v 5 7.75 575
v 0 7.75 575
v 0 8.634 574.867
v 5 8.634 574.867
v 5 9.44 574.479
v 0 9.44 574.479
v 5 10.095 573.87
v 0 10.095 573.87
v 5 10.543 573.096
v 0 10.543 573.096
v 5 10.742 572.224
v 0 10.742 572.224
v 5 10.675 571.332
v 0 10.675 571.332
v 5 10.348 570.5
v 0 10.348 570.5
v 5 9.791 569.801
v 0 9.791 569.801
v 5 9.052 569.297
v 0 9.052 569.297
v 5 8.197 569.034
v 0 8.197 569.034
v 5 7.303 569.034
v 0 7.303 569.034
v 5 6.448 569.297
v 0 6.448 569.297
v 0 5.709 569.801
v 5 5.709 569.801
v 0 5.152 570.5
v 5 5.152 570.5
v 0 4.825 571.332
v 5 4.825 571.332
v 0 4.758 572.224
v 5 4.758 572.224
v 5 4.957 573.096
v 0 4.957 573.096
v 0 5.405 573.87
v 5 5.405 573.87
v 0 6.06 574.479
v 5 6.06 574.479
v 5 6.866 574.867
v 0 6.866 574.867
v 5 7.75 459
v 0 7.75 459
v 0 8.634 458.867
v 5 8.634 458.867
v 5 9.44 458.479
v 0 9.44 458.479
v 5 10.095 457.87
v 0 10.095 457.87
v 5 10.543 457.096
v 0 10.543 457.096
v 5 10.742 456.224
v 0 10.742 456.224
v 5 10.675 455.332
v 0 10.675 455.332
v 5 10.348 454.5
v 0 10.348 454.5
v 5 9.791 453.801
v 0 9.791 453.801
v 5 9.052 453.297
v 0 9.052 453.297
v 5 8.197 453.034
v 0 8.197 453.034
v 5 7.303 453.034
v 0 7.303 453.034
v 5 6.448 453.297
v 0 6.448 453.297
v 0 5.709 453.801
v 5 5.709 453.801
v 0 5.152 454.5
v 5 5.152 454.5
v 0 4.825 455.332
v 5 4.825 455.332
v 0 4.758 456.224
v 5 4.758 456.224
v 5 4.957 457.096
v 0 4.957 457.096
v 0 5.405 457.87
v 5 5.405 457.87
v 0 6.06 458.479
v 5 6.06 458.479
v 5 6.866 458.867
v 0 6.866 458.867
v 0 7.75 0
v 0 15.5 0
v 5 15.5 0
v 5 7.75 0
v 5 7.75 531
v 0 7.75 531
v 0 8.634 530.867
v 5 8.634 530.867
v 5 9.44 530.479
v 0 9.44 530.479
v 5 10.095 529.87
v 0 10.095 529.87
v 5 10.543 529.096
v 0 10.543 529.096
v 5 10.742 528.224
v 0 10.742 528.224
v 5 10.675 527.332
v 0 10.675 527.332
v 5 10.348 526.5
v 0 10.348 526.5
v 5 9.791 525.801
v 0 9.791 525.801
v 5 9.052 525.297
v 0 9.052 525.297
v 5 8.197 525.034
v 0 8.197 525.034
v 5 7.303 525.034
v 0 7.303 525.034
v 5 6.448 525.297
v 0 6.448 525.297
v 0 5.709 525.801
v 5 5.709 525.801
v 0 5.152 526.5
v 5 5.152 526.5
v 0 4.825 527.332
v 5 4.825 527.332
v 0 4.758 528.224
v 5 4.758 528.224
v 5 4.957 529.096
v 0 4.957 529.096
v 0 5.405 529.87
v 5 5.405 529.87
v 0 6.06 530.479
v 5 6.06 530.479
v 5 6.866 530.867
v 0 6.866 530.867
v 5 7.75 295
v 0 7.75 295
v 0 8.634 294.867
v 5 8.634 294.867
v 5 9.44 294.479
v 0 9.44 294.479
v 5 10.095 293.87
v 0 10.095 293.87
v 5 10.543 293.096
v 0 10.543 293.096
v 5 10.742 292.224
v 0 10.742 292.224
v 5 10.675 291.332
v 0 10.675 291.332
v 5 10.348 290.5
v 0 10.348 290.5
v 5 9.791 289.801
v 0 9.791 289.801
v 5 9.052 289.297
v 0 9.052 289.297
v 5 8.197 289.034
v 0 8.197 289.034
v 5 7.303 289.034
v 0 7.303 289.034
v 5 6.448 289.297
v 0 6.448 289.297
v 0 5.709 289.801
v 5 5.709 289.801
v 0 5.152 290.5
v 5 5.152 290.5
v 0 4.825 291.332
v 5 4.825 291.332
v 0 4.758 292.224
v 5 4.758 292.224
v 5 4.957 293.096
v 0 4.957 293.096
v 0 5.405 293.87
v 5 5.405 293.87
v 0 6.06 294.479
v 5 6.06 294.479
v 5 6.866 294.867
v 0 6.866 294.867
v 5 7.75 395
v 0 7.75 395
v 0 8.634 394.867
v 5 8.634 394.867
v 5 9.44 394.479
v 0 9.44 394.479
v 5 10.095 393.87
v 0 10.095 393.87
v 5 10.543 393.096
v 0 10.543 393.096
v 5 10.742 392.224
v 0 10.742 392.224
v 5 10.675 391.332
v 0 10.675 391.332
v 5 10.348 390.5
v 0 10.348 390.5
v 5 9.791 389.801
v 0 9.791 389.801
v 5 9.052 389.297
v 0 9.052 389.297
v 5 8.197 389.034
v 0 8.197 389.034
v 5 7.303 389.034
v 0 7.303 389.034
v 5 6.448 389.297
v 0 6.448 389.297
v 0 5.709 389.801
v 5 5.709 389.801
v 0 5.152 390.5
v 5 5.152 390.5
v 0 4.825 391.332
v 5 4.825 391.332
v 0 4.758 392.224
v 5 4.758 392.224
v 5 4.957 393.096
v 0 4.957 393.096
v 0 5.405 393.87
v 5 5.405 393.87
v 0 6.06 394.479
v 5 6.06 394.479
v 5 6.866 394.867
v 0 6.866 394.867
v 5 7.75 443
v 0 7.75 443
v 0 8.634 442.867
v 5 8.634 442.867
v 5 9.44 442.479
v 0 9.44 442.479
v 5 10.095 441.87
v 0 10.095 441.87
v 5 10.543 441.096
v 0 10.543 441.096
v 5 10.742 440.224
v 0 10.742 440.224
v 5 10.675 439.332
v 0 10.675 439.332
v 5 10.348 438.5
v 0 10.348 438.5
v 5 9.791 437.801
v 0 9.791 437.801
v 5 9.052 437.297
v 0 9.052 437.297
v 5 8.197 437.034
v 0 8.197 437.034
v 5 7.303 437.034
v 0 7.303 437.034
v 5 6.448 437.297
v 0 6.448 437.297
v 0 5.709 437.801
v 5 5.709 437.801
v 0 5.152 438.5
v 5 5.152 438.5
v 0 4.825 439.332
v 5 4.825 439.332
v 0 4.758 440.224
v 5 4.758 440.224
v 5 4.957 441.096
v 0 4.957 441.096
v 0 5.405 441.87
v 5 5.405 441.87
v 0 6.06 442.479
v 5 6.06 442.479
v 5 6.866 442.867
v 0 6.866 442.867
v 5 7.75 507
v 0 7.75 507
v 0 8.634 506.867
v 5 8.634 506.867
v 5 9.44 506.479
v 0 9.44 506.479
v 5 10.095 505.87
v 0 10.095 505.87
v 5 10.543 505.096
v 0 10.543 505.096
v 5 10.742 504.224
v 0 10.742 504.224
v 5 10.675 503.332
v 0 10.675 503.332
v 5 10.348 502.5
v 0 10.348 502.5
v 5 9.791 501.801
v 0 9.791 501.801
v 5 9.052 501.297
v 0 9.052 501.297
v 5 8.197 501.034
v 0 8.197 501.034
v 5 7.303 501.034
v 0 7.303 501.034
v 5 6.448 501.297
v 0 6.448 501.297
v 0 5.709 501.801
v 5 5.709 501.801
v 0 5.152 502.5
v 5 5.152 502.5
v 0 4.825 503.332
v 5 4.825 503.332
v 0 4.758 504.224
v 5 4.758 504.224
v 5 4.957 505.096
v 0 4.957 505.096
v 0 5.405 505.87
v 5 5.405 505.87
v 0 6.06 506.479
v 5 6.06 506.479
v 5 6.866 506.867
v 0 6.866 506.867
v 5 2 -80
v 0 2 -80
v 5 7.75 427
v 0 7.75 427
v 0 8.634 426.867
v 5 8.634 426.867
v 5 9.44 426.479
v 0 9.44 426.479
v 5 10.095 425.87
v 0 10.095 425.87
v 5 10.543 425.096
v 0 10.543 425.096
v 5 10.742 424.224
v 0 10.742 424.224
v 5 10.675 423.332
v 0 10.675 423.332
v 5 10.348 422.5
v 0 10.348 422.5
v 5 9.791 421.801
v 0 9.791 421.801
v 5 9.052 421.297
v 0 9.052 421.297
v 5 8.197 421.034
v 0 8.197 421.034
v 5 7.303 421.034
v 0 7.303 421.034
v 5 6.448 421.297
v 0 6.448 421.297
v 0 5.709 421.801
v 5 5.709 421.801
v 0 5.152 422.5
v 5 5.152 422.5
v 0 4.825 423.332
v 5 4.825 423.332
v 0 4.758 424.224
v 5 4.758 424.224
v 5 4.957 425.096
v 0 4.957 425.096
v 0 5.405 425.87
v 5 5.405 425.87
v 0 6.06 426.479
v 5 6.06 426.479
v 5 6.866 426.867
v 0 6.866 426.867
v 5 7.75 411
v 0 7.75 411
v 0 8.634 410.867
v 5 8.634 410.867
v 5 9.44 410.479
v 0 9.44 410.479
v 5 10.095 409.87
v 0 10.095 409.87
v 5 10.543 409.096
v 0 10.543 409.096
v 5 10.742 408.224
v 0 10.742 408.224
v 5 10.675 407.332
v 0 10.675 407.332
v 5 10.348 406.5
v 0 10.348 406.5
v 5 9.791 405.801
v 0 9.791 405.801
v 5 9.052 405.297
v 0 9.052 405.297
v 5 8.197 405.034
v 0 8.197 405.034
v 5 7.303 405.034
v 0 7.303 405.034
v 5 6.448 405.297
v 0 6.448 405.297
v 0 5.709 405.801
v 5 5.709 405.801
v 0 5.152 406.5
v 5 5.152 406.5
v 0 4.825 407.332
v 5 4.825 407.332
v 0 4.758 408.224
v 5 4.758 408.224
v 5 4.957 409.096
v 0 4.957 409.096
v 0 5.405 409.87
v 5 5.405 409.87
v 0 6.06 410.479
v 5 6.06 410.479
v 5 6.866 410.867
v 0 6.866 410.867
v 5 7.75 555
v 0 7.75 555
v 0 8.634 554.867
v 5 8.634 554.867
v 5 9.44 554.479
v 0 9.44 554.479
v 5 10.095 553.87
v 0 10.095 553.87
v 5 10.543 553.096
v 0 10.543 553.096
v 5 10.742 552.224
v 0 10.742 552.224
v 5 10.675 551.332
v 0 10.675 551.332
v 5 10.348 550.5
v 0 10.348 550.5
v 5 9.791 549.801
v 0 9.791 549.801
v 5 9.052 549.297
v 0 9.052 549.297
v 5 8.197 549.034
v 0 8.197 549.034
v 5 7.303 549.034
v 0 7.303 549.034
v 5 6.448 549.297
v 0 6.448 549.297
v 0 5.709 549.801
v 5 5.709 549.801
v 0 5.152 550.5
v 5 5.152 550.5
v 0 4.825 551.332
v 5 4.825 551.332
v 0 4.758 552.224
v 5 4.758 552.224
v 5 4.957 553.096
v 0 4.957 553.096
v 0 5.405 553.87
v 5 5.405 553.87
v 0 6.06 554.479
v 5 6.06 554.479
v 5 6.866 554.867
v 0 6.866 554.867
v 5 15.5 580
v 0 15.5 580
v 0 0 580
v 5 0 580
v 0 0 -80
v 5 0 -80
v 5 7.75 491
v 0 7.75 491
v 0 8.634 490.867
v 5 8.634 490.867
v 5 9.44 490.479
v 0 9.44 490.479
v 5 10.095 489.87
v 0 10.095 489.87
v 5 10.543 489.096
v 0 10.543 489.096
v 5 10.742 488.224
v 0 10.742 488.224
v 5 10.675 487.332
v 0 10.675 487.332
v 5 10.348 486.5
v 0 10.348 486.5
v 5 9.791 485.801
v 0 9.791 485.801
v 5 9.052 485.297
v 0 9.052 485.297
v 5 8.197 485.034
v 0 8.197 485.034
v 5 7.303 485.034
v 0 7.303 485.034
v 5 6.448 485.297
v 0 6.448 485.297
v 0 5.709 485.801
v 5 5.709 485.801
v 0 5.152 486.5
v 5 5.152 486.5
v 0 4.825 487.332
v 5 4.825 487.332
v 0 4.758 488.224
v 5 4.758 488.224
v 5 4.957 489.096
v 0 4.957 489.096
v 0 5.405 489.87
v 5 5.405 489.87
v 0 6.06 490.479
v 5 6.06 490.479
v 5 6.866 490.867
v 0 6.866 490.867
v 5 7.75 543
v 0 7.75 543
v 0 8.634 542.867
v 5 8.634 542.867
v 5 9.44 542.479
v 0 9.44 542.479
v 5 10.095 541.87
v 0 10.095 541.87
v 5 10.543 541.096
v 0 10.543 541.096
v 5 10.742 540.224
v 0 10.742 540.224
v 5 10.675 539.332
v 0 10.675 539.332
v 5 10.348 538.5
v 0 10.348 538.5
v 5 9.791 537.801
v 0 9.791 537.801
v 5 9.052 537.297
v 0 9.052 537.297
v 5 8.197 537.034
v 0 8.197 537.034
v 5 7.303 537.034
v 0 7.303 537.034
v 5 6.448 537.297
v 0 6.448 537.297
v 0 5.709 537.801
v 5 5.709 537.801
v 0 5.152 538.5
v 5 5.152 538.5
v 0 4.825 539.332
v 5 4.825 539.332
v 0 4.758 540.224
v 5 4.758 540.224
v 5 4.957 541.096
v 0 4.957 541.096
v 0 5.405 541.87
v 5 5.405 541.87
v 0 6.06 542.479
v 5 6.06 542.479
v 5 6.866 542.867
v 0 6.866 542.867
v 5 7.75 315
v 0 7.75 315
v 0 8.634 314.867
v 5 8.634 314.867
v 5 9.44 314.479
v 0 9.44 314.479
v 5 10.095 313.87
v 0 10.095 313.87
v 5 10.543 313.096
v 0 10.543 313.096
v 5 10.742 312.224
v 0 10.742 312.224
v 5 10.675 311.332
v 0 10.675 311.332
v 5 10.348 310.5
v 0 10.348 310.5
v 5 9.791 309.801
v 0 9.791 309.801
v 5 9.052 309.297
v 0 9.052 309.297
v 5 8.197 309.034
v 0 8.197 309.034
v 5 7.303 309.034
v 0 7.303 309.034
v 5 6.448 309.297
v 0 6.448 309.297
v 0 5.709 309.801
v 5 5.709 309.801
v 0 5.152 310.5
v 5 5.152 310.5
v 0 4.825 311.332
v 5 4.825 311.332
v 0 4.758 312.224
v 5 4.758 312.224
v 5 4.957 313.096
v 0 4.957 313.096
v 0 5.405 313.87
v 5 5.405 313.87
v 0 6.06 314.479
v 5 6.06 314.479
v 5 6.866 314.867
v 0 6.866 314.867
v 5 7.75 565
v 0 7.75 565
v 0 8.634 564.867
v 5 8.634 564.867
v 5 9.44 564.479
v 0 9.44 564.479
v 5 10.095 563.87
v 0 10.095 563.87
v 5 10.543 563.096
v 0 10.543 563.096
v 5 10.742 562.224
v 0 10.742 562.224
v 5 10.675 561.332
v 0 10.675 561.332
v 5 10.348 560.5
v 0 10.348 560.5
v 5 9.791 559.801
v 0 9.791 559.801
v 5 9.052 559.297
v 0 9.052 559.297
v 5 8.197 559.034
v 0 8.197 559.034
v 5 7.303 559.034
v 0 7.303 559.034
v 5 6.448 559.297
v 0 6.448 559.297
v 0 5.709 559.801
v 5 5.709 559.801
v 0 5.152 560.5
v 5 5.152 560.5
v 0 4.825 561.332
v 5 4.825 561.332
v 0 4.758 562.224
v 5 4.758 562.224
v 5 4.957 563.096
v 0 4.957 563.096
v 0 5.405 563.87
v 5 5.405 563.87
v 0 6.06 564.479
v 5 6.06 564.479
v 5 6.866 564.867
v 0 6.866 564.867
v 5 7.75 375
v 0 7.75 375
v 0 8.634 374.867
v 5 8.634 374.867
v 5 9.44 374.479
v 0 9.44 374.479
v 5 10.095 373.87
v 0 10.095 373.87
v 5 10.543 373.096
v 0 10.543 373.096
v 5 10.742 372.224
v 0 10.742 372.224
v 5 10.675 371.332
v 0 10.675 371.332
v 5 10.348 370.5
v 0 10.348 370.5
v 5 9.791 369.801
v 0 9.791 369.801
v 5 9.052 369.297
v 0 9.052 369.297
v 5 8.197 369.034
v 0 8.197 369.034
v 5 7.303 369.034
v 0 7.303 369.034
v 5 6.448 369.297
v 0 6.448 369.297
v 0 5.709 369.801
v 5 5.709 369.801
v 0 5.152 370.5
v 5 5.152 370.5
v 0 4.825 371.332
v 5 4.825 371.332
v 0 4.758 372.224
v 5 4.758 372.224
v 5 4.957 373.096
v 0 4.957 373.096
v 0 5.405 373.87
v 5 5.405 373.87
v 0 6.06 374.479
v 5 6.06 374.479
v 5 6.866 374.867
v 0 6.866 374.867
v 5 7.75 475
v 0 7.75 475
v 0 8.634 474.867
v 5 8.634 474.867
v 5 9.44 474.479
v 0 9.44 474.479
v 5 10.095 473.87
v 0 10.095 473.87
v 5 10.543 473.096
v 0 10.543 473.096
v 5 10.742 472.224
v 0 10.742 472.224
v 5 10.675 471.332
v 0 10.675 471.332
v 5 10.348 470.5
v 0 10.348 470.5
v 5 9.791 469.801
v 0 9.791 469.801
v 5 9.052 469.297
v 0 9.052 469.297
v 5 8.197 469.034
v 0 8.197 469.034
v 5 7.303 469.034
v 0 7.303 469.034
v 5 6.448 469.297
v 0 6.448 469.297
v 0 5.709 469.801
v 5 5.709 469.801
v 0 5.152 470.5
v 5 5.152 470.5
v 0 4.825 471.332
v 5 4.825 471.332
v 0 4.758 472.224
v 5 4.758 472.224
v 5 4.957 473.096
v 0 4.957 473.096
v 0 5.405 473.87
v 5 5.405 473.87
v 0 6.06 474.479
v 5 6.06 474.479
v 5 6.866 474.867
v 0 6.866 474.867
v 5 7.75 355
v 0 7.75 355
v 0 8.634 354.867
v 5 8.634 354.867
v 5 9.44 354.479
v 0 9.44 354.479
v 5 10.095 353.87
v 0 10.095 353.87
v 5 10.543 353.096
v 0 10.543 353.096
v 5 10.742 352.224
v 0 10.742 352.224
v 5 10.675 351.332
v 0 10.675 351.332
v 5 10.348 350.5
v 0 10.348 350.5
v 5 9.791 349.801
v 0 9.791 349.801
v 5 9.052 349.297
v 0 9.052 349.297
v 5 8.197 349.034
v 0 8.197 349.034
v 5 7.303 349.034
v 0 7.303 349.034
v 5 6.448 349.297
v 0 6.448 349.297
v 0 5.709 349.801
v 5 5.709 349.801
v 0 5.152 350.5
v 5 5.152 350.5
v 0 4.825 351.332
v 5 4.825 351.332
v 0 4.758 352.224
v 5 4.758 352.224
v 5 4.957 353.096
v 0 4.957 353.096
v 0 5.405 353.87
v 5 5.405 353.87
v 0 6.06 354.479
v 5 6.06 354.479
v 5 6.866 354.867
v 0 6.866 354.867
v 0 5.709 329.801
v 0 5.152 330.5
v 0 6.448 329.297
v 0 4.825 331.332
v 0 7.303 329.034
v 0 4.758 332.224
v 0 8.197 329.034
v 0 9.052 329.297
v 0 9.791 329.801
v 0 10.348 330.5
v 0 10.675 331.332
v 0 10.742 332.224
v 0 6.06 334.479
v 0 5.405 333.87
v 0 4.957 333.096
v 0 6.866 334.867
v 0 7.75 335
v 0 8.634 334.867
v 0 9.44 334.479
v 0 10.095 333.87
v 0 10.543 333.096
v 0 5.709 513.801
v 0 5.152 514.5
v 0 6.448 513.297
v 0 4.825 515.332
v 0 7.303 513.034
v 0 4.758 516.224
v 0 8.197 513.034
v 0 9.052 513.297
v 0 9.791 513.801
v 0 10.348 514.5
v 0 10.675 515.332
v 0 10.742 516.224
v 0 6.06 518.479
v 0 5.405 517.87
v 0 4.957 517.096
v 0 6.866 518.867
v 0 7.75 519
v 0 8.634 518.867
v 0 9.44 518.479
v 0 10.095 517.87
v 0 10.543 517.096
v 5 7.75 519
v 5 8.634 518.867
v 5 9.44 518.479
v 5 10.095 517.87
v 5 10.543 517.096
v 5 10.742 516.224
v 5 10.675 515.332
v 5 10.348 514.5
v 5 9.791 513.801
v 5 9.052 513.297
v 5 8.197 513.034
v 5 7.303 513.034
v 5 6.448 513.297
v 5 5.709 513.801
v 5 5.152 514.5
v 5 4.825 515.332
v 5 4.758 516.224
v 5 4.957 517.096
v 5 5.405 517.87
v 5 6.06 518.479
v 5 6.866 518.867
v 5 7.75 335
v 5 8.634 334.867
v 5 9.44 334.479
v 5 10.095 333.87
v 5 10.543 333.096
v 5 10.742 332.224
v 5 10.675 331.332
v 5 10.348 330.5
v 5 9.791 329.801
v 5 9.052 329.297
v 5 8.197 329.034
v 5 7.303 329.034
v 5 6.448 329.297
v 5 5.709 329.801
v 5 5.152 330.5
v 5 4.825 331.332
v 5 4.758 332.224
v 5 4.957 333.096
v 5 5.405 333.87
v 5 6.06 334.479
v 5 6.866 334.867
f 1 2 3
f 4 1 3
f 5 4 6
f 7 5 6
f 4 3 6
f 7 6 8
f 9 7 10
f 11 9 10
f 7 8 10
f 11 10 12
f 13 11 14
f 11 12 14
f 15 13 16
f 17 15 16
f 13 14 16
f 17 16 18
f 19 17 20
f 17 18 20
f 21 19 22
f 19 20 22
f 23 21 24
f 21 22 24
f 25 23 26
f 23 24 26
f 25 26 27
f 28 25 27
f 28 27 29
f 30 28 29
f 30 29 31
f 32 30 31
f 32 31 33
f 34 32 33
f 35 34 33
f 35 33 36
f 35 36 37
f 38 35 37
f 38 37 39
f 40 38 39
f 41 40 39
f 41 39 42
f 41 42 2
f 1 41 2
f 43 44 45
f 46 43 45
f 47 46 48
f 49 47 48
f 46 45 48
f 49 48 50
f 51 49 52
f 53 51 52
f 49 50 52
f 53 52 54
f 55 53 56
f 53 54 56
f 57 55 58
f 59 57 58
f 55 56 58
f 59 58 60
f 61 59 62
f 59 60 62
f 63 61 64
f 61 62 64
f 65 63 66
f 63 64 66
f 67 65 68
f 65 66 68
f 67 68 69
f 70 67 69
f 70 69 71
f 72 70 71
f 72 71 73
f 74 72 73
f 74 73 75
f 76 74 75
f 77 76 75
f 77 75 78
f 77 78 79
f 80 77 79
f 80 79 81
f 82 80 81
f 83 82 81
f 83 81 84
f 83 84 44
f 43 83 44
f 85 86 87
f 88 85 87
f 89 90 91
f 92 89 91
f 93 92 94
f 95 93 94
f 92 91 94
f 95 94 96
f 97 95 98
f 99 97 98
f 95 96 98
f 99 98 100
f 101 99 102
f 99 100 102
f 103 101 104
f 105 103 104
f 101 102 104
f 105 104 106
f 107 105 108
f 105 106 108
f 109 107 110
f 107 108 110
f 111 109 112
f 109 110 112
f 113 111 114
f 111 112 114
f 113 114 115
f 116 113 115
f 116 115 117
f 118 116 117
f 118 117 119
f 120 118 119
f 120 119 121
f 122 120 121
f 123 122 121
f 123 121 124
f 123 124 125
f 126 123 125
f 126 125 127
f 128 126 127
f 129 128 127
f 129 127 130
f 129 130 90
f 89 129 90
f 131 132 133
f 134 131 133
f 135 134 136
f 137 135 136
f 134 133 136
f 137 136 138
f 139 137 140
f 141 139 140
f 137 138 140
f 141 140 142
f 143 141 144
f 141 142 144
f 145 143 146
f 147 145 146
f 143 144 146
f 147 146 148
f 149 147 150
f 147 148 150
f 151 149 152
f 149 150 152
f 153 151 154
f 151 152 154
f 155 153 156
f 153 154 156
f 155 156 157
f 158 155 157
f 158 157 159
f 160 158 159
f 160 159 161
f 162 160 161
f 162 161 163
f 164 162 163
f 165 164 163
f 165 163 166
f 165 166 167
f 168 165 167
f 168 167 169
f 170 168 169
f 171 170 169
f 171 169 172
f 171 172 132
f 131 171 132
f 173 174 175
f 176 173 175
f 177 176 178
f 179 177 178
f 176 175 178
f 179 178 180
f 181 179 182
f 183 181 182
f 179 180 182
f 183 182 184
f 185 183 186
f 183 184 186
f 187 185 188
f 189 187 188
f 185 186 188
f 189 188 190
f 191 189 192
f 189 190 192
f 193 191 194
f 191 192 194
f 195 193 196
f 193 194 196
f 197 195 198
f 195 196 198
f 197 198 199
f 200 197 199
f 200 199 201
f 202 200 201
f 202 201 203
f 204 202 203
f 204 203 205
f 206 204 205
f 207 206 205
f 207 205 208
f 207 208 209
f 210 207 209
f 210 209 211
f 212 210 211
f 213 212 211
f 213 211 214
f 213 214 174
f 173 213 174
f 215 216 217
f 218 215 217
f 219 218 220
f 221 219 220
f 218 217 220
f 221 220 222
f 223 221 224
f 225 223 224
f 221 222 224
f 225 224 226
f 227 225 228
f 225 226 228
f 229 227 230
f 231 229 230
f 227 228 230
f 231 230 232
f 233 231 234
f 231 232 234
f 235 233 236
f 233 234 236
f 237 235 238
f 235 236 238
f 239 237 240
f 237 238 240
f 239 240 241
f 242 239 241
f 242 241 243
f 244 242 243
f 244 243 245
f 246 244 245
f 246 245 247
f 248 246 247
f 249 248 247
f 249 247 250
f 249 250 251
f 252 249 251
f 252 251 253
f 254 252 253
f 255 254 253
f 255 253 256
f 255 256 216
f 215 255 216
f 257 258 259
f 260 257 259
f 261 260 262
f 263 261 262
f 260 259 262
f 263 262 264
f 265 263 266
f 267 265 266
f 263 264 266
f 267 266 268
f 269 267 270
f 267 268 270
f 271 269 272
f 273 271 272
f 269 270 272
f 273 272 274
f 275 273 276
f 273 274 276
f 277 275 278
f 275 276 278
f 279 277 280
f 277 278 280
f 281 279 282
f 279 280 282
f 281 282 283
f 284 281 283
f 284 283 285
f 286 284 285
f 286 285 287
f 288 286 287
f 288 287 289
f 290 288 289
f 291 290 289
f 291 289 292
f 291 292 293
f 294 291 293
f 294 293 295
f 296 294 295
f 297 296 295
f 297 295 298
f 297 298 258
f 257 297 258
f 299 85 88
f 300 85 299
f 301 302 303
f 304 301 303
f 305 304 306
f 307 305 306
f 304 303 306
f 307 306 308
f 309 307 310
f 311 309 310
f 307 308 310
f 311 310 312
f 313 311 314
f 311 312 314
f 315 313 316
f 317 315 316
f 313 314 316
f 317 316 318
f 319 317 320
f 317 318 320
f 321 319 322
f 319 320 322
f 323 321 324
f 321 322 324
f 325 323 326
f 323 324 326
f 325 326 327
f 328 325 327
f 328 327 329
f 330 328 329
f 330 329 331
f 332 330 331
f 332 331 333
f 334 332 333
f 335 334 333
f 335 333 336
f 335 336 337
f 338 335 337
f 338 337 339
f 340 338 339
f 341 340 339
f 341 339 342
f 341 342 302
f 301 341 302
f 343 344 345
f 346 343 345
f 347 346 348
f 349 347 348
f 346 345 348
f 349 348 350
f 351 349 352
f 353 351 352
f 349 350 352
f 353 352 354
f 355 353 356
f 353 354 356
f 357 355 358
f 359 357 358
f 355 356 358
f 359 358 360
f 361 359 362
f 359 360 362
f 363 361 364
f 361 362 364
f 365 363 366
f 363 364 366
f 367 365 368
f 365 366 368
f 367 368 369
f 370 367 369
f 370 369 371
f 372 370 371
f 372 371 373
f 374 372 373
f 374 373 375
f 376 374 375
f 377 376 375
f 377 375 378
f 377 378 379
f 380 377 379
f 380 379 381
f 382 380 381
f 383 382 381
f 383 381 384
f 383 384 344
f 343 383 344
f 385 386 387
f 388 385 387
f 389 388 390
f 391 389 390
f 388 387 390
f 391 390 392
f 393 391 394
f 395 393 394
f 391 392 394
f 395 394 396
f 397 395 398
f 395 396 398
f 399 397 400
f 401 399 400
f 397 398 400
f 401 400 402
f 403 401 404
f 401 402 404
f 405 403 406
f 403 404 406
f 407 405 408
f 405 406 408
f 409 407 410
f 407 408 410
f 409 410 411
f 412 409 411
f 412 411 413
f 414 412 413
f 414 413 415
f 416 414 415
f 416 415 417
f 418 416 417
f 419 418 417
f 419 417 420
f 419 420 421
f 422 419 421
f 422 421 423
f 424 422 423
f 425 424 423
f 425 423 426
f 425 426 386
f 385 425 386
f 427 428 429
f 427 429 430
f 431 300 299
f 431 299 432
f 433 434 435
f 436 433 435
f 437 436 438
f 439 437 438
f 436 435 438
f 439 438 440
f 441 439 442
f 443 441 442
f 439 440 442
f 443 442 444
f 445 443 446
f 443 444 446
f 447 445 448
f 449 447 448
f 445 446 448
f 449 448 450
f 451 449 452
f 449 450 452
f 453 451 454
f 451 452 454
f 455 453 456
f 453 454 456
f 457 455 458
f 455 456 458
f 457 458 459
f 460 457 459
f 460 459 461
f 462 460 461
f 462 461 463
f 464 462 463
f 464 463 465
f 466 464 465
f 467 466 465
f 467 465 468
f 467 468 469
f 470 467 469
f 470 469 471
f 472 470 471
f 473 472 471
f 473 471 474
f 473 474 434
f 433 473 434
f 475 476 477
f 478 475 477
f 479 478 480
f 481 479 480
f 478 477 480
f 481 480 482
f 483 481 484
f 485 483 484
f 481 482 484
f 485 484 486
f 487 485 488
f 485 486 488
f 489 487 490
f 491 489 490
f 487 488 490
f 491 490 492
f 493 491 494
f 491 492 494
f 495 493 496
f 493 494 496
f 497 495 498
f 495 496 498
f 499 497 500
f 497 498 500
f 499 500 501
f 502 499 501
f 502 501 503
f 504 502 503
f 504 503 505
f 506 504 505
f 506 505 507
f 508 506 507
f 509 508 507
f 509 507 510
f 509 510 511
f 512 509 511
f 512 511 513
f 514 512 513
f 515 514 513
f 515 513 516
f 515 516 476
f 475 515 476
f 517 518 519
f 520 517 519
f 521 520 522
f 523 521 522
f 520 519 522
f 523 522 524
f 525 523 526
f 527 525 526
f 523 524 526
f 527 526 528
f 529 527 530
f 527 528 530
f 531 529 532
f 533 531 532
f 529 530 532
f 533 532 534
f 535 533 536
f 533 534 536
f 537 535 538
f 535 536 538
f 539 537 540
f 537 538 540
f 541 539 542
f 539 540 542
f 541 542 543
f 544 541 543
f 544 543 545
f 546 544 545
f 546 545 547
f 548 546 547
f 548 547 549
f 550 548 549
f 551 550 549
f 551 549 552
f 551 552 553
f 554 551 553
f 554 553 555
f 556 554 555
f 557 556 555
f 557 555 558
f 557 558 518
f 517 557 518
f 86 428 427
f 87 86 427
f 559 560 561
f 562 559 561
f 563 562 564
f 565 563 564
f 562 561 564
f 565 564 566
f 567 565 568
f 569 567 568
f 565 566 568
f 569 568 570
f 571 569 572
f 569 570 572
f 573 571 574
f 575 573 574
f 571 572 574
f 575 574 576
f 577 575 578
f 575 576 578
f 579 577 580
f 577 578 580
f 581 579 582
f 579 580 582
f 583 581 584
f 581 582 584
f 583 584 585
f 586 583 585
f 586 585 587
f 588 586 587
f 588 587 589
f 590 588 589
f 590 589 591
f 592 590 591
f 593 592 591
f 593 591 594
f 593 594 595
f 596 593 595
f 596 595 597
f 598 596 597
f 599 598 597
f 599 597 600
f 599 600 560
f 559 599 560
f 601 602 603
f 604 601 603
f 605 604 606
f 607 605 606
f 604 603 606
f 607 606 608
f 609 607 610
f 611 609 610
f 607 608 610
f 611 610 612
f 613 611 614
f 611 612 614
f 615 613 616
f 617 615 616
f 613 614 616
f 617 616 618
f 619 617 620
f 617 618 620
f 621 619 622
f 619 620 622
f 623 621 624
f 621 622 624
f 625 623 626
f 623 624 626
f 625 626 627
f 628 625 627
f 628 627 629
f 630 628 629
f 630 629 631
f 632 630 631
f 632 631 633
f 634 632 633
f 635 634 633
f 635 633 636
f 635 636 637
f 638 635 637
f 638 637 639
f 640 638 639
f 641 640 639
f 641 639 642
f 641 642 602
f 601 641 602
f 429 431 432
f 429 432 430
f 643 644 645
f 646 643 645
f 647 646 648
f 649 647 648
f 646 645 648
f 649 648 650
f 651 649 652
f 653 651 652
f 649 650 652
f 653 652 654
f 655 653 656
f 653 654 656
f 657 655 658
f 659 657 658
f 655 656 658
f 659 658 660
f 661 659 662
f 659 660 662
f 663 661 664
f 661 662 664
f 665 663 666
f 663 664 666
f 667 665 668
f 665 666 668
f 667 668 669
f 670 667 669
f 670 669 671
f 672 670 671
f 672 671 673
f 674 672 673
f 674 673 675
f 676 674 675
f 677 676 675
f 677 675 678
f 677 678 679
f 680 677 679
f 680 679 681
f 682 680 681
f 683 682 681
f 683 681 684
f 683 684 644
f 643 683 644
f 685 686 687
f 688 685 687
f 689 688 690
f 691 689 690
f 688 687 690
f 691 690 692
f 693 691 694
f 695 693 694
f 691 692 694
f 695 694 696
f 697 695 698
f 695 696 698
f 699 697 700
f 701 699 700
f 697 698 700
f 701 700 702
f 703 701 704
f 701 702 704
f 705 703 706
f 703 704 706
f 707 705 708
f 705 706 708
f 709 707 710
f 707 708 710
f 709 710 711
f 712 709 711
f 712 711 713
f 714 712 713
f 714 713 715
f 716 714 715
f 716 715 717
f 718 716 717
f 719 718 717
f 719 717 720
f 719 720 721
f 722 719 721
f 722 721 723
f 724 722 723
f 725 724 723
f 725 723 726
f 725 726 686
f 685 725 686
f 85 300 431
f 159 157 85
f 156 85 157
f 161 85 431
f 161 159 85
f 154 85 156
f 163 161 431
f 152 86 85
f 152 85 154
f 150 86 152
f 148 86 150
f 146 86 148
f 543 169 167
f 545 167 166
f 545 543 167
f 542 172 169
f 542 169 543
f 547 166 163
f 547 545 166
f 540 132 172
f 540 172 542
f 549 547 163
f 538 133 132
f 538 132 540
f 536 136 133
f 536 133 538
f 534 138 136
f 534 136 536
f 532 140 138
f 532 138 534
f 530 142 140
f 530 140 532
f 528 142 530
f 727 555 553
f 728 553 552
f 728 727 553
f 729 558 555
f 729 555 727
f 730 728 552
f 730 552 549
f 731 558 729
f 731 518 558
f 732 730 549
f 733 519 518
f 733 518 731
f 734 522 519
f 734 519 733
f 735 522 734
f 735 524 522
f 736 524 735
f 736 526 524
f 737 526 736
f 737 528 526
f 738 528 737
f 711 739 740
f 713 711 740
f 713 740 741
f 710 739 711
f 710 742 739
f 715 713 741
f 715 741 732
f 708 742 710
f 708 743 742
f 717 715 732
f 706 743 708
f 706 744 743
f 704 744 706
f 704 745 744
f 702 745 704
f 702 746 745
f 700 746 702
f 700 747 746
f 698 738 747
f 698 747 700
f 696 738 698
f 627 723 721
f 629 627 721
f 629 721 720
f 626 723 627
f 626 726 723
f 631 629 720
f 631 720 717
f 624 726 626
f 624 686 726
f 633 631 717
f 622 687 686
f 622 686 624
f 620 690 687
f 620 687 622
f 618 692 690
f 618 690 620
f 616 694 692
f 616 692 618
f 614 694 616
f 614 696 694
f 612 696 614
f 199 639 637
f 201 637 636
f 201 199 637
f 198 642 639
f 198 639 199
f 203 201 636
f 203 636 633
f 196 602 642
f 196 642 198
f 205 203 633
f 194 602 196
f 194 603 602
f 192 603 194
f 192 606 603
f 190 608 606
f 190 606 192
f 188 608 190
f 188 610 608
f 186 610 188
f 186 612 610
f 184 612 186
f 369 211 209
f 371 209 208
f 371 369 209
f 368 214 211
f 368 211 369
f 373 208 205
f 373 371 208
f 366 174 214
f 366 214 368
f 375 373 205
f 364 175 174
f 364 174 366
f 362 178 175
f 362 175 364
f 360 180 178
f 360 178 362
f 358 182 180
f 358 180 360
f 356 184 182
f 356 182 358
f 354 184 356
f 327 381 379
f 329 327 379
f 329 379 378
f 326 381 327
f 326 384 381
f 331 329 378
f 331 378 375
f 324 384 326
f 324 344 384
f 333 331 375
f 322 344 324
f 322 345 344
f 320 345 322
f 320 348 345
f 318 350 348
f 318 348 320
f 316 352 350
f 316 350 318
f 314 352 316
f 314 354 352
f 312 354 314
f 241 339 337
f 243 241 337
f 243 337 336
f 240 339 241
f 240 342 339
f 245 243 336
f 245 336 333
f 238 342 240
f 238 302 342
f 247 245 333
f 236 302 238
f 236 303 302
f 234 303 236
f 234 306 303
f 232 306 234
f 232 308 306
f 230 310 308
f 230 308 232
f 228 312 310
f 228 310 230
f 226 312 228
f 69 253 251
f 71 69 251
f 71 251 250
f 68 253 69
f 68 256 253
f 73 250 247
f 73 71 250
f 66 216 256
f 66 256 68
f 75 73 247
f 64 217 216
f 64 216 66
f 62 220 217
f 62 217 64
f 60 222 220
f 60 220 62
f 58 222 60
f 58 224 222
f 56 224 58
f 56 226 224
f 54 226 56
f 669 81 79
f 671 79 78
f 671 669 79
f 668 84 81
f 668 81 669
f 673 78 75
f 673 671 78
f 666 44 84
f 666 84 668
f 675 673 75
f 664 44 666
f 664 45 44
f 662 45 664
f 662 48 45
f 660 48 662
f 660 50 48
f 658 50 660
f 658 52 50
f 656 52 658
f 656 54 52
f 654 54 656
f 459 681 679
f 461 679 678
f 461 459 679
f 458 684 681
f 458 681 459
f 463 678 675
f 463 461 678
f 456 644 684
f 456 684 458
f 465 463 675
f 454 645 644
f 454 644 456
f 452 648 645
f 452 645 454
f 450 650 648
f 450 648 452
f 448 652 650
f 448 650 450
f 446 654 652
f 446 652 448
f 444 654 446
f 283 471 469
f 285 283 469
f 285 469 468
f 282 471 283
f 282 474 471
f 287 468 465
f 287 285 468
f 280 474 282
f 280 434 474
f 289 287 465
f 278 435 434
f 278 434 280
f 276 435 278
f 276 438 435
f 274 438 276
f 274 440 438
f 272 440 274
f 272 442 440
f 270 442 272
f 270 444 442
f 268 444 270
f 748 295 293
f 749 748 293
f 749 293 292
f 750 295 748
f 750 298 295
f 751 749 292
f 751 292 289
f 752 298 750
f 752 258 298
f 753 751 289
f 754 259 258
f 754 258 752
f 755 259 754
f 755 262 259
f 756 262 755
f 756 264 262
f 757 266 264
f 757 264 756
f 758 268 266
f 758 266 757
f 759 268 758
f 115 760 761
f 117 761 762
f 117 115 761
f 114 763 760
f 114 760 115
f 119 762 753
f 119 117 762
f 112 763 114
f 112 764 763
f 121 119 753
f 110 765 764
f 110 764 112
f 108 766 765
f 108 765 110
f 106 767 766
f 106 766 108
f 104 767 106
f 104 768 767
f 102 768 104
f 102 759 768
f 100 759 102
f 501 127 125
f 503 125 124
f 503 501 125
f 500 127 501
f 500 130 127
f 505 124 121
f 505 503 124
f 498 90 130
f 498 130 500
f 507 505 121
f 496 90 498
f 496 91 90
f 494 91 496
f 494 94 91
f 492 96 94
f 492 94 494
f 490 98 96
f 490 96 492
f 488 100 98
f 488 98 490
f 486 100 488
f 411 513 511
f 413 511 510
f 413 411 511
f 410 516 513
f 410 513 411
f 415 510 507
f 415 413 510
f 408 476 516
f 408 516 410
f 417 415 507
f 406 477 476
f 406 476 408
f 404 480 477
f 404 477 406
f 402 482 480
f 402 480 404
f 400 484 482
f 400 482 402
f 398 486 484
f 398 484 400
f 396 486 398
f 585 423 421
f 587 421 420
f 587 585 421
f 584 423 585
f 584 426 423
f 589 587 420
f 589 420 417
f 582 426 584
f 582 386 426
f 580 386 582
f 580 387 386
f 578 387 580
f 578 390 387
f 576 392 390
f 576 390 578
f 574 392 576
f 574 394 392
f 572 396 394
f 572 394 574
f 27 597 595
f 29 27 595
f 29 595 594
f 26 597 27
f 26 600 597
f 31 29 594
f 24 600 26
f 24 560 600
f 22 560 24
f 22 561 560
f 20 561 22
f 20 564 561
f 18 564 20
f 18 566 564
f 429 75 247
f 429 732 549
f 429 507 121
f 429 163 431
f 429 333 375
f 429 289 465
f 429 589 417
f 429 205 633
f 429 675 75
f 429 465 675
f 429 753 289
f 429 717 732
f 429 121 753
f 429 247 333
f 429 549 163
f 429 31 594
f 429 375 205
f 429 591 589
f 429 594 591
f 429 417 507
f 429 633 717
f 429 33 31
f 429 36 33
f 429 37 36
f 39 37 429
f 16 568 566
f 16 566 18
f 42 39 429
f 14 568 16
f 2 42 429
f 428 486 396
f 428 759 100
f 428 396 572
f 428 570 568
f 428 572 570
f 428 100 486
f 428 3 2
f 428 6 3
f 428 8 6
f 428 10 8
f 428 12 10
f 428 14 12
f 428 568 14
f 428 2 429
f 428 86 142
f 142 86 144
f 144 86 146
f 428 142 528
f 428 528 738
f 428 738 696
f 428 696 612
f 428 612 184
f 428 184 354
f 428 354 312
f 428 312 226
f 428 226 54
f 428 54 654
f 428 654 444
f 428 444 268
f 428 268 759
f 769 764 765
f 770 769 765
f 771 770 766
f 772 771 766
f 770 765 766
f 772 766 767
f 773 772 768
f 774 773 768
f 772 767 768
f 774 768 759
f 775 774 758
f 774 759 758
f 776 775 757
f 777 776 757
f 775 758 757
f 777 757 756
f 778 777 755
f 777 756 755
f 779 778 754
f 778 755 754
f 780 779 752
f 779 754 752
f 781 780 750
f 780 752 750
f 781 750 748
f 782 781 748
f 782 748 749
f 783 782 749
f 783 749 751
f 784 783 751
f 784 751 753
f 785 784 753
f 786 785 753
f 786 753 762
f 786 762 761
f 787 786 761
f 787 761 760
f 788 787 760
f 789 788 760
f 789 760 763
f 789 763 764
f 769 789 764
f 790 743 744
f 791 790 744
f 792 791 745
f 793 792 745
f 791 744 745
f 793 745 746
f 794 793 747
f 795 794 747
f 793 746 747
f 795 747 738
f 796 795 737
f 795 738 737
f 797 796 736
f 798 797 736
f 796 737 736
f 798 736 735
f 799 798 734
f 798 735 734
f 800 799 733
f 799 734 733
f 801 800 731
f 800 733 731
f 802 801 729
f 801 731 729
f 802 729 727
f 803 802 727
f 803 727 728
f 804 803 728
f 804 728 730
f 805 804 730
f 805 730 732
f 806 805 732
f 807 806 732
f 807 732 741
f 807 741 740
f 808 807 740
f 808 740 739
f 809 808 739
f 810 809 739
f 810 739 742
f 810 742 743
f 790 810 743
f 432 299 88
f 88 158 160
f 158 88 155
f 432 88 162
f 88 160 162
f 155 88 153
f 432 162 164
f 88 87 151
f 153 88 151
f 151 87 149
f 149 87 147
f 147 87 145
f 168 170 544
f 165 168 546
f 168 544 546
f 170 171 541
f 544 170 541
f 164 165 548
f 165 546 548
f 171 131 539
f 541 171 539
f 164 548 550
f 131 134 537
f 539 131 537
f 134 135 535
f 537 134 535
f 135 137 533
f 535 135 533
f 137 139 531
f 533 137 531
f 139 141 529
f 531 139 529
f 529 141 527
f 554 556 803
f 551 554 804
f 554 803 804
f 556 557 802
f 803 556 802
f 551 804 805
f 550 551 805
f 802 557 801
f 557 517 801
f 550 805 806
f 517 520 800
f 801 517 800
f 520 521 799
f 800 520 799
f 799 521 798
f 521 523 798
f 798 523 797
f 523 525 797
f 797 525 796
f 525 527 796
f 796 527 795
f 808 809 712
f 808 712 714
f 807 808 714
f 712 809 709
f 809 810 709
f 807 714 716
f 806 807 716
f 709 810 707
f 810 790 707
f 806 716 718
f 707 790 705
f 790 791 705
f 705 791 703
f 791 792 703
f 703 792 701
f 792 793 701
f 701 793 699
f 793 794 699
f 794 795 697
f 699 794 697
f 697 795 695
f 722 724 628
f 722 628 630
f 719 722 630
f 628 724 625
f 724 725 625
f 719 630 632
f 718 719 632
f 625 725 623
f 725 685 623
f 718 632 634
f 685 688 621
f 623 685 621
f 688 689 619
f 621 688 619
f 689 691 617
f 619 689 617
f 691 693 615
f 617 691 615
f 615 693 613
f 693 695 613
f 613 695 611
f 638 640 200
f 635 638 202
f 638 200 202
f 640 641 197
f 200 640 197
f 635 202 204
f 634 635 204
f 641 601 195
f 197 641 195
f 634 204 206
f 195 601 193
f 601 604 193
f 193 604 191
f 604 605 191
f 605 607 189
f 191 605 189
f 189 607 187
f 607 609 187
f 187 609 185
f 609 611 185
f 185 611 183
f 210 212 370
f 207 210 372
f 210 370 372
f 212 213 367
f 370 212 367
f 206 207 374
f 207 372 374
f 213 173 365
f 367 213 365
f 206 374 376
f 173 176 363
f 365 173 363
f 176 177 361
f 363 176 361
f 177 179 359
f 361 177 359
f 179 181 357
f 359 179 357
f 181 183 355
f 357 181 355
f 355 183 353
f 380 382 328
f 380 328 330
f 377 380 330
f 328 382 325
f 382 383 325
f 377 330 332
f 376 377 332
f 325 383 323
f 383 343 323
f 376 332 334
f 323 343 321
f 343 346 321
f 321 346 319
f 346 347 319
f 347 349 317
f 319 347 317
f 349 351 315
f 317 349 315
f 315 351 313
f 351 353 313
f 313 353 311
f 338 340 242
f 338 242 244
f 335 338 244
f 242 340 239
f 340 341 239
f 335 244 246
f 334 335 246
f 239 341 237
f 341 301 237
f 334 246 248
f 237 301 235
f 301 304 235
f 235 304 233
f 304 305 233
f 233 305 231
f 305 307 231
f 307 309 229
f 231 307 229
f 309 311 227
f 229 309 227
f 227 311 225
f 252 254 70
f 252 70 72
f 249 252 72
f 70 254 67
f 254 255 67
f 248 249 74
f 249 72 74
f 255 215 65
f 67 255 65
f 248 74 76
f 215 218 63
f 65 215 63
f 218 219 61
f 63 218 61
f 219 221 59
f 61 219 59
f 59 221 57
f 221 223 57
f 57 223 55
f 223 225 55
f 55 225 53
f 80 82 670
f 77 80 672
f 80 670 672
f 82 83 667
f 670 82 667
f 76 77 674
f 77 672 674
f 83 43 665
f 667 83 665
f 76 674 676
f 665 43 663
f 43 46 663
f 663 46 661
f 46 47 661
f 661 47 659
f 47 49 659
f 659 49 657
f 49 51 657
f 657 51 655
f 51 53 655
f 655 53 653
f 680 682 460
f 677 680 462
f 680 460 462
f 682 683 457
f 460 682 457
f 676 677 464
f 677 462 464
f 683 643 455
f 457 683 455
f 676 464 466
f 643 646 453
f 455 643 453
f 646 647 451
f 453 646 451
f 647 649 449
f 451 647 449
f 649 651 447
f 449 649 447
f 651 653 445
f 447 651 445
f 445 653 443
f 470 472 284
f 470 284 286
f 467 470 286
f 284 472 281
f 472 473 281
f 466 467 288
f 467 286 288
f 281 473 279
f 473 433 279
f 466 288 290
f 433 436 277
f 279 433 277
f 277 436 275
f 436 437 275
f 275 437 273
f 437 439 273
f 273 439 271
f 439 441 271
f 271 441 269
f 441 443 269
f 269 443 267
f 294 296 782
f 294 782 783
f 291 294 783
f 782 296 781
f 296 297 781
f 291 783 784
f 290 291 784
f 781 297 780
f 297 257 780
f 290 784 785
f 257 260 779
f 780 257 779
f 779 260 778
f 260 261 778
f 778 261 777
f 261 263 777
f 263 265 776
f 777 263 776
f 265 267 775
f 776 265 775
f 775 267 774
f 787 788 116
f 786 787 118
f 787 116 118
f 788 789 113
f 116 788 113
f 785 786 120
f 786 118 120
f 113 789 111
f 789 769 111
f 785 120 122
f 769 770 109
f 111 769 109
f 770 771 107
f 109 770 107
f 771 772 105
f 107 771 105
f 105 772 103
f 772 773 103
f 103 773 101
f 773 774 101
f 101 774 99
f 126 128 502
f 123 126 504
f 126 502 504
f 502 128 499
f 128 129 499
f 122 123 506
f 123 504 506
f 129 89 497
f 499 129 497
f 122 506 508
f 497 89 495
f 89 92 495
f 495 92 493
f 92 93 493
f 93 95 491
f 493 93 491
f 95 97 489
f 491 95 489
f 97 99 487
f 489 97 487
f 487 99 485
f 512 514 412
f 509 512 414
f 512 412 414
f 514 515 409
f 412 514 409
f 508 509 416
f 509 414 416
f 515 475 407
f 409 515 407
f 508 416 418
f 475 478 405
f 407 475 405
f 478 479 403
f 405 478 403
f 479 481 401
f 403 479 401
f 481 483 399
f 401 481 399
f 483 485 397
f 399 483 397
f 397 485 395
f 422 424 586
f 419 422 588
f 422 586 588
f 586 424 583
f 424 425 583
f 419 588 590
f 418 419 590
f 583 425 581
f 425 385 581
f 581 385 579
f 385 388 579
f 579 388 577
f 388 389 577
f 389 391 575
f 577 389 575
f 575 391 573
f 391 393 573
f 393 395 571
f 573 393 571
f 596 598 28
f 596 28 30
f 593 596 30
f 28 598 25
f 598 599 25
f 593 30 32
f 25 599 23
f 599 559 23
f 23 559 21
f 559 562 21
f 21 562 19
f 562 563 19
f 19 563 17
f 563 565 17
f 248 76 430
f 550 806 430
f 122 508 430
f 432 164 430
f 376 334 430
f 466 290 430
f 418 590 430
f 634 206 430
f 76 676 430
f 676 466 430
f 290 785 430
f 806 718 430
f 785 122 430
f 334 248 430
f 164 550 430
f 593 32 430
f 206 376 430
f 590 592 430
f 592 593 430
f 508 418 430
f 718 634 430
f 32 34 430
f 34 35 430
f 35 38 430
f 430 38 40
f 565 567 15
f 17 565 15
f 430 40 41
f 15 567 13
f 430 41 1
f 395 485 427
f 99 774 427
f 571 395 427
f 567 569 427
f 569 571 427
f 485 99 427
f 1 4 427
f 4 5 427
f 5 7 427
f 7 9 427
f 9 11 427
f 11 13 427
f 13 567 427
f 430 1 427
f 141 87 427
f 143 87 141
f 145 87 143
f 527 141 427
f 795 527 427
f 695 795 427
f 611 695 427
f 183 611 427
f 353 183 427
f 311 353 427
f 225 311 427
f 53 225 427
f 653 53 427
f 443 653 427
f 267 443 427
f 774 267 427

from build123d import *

# Parameters (mm, degrees)
SKIZZE1_W                       = 5
SKIZZE1_H                       = 15.5
GRUNDSTAB_DEPTH                 = 580
AUFSATZ_LINEAR_AUSTRAGEN2_DEPTH = 5
SKIZZE4_R                       = 3
SCHNITT_LINEAR_AUSTRAGEN1_DEPTH = 581.228618736


with BuildPart() as part:
    # Skizze1 → GrundStab (new body)
    with BuildSketch(Plane.XY):
        with Locations((2.5, 7.75)):
            Rectangle(SKIZZE1_W, SKIZZE1_H)
    extrude(amount=GRUNDSTAB_DEPTH)

    # Skizze3 → Aufsatz-Linear austragen2 (add, through all)
    with BuildSketch(Plane.ZY):
        Polygon((0, 7.75), (-80, 2), (-80, 0), (0, 0), align=None)
    extrude(amount=-AUFSATZ_LINEAR_AUSTRAGEN2_DEPTH)

    # Skizze4 → Schnitt-Linear austragen1 (cut, through all)
    with BuildSketch(Plane.ZY):
        with Locations((572, 7.75)):
            Circle(SKIZZE4_R)
        with Locations((562, 7.75)):
            Circle(SKIZZE4_R)
        with Locations((552, 7.75)):
            Circle(SKIZZE4_R)
        with Locations((540, 7.75)):
            Circle(SKIZZE4_R)
        with Locations((528, 7.75)):
            Circle(SKIZZE4_R)
        with Locations((516, 7.75)):
            Circle(SKIZZE4_R)
        with Locations((504, 7.75)):
            Circle(SKIZZE4_R)
        with Locations((488, 7.75)):
            Circle(SKIZZE4_R)
        with Locations((472, 7.75)):
            Circle(SKIZZE4_R)
        with Locations((456, 7.75)):
            Circle(SKIZZE4_R)
        with Locations((440, 7.75)):
            Circle(SKIZZE4_R)
        with Locations((424, 7.75)):
            Circle(SKIZZE4_R)
        with Locations((408, 7.75)):
            Circle(SKIZZE4_R)
        with Locations((392, 7.75)):
            Circle(SKIZZE4_R)
        with Locations((372, 7.75)):
            Circle(SKIZZE4_R)
        with Locations((352, 7.75)):
            Circle(SKIZZE4_R)
        with Locations((332, 7.75)):
            Circle(SKIZZE4_R)
        with Locations((312, 7.75)):
            Circle(SKIZZE4_R)
        with Locations((292, 7.75)):
            Circle(SKIZZE4_R)
    extrude(amount=-SCHNITT_LINEAR_AUSTRAGEN1_DEPTH, mode=Mode.SUBTRACT)


solid = part.part
